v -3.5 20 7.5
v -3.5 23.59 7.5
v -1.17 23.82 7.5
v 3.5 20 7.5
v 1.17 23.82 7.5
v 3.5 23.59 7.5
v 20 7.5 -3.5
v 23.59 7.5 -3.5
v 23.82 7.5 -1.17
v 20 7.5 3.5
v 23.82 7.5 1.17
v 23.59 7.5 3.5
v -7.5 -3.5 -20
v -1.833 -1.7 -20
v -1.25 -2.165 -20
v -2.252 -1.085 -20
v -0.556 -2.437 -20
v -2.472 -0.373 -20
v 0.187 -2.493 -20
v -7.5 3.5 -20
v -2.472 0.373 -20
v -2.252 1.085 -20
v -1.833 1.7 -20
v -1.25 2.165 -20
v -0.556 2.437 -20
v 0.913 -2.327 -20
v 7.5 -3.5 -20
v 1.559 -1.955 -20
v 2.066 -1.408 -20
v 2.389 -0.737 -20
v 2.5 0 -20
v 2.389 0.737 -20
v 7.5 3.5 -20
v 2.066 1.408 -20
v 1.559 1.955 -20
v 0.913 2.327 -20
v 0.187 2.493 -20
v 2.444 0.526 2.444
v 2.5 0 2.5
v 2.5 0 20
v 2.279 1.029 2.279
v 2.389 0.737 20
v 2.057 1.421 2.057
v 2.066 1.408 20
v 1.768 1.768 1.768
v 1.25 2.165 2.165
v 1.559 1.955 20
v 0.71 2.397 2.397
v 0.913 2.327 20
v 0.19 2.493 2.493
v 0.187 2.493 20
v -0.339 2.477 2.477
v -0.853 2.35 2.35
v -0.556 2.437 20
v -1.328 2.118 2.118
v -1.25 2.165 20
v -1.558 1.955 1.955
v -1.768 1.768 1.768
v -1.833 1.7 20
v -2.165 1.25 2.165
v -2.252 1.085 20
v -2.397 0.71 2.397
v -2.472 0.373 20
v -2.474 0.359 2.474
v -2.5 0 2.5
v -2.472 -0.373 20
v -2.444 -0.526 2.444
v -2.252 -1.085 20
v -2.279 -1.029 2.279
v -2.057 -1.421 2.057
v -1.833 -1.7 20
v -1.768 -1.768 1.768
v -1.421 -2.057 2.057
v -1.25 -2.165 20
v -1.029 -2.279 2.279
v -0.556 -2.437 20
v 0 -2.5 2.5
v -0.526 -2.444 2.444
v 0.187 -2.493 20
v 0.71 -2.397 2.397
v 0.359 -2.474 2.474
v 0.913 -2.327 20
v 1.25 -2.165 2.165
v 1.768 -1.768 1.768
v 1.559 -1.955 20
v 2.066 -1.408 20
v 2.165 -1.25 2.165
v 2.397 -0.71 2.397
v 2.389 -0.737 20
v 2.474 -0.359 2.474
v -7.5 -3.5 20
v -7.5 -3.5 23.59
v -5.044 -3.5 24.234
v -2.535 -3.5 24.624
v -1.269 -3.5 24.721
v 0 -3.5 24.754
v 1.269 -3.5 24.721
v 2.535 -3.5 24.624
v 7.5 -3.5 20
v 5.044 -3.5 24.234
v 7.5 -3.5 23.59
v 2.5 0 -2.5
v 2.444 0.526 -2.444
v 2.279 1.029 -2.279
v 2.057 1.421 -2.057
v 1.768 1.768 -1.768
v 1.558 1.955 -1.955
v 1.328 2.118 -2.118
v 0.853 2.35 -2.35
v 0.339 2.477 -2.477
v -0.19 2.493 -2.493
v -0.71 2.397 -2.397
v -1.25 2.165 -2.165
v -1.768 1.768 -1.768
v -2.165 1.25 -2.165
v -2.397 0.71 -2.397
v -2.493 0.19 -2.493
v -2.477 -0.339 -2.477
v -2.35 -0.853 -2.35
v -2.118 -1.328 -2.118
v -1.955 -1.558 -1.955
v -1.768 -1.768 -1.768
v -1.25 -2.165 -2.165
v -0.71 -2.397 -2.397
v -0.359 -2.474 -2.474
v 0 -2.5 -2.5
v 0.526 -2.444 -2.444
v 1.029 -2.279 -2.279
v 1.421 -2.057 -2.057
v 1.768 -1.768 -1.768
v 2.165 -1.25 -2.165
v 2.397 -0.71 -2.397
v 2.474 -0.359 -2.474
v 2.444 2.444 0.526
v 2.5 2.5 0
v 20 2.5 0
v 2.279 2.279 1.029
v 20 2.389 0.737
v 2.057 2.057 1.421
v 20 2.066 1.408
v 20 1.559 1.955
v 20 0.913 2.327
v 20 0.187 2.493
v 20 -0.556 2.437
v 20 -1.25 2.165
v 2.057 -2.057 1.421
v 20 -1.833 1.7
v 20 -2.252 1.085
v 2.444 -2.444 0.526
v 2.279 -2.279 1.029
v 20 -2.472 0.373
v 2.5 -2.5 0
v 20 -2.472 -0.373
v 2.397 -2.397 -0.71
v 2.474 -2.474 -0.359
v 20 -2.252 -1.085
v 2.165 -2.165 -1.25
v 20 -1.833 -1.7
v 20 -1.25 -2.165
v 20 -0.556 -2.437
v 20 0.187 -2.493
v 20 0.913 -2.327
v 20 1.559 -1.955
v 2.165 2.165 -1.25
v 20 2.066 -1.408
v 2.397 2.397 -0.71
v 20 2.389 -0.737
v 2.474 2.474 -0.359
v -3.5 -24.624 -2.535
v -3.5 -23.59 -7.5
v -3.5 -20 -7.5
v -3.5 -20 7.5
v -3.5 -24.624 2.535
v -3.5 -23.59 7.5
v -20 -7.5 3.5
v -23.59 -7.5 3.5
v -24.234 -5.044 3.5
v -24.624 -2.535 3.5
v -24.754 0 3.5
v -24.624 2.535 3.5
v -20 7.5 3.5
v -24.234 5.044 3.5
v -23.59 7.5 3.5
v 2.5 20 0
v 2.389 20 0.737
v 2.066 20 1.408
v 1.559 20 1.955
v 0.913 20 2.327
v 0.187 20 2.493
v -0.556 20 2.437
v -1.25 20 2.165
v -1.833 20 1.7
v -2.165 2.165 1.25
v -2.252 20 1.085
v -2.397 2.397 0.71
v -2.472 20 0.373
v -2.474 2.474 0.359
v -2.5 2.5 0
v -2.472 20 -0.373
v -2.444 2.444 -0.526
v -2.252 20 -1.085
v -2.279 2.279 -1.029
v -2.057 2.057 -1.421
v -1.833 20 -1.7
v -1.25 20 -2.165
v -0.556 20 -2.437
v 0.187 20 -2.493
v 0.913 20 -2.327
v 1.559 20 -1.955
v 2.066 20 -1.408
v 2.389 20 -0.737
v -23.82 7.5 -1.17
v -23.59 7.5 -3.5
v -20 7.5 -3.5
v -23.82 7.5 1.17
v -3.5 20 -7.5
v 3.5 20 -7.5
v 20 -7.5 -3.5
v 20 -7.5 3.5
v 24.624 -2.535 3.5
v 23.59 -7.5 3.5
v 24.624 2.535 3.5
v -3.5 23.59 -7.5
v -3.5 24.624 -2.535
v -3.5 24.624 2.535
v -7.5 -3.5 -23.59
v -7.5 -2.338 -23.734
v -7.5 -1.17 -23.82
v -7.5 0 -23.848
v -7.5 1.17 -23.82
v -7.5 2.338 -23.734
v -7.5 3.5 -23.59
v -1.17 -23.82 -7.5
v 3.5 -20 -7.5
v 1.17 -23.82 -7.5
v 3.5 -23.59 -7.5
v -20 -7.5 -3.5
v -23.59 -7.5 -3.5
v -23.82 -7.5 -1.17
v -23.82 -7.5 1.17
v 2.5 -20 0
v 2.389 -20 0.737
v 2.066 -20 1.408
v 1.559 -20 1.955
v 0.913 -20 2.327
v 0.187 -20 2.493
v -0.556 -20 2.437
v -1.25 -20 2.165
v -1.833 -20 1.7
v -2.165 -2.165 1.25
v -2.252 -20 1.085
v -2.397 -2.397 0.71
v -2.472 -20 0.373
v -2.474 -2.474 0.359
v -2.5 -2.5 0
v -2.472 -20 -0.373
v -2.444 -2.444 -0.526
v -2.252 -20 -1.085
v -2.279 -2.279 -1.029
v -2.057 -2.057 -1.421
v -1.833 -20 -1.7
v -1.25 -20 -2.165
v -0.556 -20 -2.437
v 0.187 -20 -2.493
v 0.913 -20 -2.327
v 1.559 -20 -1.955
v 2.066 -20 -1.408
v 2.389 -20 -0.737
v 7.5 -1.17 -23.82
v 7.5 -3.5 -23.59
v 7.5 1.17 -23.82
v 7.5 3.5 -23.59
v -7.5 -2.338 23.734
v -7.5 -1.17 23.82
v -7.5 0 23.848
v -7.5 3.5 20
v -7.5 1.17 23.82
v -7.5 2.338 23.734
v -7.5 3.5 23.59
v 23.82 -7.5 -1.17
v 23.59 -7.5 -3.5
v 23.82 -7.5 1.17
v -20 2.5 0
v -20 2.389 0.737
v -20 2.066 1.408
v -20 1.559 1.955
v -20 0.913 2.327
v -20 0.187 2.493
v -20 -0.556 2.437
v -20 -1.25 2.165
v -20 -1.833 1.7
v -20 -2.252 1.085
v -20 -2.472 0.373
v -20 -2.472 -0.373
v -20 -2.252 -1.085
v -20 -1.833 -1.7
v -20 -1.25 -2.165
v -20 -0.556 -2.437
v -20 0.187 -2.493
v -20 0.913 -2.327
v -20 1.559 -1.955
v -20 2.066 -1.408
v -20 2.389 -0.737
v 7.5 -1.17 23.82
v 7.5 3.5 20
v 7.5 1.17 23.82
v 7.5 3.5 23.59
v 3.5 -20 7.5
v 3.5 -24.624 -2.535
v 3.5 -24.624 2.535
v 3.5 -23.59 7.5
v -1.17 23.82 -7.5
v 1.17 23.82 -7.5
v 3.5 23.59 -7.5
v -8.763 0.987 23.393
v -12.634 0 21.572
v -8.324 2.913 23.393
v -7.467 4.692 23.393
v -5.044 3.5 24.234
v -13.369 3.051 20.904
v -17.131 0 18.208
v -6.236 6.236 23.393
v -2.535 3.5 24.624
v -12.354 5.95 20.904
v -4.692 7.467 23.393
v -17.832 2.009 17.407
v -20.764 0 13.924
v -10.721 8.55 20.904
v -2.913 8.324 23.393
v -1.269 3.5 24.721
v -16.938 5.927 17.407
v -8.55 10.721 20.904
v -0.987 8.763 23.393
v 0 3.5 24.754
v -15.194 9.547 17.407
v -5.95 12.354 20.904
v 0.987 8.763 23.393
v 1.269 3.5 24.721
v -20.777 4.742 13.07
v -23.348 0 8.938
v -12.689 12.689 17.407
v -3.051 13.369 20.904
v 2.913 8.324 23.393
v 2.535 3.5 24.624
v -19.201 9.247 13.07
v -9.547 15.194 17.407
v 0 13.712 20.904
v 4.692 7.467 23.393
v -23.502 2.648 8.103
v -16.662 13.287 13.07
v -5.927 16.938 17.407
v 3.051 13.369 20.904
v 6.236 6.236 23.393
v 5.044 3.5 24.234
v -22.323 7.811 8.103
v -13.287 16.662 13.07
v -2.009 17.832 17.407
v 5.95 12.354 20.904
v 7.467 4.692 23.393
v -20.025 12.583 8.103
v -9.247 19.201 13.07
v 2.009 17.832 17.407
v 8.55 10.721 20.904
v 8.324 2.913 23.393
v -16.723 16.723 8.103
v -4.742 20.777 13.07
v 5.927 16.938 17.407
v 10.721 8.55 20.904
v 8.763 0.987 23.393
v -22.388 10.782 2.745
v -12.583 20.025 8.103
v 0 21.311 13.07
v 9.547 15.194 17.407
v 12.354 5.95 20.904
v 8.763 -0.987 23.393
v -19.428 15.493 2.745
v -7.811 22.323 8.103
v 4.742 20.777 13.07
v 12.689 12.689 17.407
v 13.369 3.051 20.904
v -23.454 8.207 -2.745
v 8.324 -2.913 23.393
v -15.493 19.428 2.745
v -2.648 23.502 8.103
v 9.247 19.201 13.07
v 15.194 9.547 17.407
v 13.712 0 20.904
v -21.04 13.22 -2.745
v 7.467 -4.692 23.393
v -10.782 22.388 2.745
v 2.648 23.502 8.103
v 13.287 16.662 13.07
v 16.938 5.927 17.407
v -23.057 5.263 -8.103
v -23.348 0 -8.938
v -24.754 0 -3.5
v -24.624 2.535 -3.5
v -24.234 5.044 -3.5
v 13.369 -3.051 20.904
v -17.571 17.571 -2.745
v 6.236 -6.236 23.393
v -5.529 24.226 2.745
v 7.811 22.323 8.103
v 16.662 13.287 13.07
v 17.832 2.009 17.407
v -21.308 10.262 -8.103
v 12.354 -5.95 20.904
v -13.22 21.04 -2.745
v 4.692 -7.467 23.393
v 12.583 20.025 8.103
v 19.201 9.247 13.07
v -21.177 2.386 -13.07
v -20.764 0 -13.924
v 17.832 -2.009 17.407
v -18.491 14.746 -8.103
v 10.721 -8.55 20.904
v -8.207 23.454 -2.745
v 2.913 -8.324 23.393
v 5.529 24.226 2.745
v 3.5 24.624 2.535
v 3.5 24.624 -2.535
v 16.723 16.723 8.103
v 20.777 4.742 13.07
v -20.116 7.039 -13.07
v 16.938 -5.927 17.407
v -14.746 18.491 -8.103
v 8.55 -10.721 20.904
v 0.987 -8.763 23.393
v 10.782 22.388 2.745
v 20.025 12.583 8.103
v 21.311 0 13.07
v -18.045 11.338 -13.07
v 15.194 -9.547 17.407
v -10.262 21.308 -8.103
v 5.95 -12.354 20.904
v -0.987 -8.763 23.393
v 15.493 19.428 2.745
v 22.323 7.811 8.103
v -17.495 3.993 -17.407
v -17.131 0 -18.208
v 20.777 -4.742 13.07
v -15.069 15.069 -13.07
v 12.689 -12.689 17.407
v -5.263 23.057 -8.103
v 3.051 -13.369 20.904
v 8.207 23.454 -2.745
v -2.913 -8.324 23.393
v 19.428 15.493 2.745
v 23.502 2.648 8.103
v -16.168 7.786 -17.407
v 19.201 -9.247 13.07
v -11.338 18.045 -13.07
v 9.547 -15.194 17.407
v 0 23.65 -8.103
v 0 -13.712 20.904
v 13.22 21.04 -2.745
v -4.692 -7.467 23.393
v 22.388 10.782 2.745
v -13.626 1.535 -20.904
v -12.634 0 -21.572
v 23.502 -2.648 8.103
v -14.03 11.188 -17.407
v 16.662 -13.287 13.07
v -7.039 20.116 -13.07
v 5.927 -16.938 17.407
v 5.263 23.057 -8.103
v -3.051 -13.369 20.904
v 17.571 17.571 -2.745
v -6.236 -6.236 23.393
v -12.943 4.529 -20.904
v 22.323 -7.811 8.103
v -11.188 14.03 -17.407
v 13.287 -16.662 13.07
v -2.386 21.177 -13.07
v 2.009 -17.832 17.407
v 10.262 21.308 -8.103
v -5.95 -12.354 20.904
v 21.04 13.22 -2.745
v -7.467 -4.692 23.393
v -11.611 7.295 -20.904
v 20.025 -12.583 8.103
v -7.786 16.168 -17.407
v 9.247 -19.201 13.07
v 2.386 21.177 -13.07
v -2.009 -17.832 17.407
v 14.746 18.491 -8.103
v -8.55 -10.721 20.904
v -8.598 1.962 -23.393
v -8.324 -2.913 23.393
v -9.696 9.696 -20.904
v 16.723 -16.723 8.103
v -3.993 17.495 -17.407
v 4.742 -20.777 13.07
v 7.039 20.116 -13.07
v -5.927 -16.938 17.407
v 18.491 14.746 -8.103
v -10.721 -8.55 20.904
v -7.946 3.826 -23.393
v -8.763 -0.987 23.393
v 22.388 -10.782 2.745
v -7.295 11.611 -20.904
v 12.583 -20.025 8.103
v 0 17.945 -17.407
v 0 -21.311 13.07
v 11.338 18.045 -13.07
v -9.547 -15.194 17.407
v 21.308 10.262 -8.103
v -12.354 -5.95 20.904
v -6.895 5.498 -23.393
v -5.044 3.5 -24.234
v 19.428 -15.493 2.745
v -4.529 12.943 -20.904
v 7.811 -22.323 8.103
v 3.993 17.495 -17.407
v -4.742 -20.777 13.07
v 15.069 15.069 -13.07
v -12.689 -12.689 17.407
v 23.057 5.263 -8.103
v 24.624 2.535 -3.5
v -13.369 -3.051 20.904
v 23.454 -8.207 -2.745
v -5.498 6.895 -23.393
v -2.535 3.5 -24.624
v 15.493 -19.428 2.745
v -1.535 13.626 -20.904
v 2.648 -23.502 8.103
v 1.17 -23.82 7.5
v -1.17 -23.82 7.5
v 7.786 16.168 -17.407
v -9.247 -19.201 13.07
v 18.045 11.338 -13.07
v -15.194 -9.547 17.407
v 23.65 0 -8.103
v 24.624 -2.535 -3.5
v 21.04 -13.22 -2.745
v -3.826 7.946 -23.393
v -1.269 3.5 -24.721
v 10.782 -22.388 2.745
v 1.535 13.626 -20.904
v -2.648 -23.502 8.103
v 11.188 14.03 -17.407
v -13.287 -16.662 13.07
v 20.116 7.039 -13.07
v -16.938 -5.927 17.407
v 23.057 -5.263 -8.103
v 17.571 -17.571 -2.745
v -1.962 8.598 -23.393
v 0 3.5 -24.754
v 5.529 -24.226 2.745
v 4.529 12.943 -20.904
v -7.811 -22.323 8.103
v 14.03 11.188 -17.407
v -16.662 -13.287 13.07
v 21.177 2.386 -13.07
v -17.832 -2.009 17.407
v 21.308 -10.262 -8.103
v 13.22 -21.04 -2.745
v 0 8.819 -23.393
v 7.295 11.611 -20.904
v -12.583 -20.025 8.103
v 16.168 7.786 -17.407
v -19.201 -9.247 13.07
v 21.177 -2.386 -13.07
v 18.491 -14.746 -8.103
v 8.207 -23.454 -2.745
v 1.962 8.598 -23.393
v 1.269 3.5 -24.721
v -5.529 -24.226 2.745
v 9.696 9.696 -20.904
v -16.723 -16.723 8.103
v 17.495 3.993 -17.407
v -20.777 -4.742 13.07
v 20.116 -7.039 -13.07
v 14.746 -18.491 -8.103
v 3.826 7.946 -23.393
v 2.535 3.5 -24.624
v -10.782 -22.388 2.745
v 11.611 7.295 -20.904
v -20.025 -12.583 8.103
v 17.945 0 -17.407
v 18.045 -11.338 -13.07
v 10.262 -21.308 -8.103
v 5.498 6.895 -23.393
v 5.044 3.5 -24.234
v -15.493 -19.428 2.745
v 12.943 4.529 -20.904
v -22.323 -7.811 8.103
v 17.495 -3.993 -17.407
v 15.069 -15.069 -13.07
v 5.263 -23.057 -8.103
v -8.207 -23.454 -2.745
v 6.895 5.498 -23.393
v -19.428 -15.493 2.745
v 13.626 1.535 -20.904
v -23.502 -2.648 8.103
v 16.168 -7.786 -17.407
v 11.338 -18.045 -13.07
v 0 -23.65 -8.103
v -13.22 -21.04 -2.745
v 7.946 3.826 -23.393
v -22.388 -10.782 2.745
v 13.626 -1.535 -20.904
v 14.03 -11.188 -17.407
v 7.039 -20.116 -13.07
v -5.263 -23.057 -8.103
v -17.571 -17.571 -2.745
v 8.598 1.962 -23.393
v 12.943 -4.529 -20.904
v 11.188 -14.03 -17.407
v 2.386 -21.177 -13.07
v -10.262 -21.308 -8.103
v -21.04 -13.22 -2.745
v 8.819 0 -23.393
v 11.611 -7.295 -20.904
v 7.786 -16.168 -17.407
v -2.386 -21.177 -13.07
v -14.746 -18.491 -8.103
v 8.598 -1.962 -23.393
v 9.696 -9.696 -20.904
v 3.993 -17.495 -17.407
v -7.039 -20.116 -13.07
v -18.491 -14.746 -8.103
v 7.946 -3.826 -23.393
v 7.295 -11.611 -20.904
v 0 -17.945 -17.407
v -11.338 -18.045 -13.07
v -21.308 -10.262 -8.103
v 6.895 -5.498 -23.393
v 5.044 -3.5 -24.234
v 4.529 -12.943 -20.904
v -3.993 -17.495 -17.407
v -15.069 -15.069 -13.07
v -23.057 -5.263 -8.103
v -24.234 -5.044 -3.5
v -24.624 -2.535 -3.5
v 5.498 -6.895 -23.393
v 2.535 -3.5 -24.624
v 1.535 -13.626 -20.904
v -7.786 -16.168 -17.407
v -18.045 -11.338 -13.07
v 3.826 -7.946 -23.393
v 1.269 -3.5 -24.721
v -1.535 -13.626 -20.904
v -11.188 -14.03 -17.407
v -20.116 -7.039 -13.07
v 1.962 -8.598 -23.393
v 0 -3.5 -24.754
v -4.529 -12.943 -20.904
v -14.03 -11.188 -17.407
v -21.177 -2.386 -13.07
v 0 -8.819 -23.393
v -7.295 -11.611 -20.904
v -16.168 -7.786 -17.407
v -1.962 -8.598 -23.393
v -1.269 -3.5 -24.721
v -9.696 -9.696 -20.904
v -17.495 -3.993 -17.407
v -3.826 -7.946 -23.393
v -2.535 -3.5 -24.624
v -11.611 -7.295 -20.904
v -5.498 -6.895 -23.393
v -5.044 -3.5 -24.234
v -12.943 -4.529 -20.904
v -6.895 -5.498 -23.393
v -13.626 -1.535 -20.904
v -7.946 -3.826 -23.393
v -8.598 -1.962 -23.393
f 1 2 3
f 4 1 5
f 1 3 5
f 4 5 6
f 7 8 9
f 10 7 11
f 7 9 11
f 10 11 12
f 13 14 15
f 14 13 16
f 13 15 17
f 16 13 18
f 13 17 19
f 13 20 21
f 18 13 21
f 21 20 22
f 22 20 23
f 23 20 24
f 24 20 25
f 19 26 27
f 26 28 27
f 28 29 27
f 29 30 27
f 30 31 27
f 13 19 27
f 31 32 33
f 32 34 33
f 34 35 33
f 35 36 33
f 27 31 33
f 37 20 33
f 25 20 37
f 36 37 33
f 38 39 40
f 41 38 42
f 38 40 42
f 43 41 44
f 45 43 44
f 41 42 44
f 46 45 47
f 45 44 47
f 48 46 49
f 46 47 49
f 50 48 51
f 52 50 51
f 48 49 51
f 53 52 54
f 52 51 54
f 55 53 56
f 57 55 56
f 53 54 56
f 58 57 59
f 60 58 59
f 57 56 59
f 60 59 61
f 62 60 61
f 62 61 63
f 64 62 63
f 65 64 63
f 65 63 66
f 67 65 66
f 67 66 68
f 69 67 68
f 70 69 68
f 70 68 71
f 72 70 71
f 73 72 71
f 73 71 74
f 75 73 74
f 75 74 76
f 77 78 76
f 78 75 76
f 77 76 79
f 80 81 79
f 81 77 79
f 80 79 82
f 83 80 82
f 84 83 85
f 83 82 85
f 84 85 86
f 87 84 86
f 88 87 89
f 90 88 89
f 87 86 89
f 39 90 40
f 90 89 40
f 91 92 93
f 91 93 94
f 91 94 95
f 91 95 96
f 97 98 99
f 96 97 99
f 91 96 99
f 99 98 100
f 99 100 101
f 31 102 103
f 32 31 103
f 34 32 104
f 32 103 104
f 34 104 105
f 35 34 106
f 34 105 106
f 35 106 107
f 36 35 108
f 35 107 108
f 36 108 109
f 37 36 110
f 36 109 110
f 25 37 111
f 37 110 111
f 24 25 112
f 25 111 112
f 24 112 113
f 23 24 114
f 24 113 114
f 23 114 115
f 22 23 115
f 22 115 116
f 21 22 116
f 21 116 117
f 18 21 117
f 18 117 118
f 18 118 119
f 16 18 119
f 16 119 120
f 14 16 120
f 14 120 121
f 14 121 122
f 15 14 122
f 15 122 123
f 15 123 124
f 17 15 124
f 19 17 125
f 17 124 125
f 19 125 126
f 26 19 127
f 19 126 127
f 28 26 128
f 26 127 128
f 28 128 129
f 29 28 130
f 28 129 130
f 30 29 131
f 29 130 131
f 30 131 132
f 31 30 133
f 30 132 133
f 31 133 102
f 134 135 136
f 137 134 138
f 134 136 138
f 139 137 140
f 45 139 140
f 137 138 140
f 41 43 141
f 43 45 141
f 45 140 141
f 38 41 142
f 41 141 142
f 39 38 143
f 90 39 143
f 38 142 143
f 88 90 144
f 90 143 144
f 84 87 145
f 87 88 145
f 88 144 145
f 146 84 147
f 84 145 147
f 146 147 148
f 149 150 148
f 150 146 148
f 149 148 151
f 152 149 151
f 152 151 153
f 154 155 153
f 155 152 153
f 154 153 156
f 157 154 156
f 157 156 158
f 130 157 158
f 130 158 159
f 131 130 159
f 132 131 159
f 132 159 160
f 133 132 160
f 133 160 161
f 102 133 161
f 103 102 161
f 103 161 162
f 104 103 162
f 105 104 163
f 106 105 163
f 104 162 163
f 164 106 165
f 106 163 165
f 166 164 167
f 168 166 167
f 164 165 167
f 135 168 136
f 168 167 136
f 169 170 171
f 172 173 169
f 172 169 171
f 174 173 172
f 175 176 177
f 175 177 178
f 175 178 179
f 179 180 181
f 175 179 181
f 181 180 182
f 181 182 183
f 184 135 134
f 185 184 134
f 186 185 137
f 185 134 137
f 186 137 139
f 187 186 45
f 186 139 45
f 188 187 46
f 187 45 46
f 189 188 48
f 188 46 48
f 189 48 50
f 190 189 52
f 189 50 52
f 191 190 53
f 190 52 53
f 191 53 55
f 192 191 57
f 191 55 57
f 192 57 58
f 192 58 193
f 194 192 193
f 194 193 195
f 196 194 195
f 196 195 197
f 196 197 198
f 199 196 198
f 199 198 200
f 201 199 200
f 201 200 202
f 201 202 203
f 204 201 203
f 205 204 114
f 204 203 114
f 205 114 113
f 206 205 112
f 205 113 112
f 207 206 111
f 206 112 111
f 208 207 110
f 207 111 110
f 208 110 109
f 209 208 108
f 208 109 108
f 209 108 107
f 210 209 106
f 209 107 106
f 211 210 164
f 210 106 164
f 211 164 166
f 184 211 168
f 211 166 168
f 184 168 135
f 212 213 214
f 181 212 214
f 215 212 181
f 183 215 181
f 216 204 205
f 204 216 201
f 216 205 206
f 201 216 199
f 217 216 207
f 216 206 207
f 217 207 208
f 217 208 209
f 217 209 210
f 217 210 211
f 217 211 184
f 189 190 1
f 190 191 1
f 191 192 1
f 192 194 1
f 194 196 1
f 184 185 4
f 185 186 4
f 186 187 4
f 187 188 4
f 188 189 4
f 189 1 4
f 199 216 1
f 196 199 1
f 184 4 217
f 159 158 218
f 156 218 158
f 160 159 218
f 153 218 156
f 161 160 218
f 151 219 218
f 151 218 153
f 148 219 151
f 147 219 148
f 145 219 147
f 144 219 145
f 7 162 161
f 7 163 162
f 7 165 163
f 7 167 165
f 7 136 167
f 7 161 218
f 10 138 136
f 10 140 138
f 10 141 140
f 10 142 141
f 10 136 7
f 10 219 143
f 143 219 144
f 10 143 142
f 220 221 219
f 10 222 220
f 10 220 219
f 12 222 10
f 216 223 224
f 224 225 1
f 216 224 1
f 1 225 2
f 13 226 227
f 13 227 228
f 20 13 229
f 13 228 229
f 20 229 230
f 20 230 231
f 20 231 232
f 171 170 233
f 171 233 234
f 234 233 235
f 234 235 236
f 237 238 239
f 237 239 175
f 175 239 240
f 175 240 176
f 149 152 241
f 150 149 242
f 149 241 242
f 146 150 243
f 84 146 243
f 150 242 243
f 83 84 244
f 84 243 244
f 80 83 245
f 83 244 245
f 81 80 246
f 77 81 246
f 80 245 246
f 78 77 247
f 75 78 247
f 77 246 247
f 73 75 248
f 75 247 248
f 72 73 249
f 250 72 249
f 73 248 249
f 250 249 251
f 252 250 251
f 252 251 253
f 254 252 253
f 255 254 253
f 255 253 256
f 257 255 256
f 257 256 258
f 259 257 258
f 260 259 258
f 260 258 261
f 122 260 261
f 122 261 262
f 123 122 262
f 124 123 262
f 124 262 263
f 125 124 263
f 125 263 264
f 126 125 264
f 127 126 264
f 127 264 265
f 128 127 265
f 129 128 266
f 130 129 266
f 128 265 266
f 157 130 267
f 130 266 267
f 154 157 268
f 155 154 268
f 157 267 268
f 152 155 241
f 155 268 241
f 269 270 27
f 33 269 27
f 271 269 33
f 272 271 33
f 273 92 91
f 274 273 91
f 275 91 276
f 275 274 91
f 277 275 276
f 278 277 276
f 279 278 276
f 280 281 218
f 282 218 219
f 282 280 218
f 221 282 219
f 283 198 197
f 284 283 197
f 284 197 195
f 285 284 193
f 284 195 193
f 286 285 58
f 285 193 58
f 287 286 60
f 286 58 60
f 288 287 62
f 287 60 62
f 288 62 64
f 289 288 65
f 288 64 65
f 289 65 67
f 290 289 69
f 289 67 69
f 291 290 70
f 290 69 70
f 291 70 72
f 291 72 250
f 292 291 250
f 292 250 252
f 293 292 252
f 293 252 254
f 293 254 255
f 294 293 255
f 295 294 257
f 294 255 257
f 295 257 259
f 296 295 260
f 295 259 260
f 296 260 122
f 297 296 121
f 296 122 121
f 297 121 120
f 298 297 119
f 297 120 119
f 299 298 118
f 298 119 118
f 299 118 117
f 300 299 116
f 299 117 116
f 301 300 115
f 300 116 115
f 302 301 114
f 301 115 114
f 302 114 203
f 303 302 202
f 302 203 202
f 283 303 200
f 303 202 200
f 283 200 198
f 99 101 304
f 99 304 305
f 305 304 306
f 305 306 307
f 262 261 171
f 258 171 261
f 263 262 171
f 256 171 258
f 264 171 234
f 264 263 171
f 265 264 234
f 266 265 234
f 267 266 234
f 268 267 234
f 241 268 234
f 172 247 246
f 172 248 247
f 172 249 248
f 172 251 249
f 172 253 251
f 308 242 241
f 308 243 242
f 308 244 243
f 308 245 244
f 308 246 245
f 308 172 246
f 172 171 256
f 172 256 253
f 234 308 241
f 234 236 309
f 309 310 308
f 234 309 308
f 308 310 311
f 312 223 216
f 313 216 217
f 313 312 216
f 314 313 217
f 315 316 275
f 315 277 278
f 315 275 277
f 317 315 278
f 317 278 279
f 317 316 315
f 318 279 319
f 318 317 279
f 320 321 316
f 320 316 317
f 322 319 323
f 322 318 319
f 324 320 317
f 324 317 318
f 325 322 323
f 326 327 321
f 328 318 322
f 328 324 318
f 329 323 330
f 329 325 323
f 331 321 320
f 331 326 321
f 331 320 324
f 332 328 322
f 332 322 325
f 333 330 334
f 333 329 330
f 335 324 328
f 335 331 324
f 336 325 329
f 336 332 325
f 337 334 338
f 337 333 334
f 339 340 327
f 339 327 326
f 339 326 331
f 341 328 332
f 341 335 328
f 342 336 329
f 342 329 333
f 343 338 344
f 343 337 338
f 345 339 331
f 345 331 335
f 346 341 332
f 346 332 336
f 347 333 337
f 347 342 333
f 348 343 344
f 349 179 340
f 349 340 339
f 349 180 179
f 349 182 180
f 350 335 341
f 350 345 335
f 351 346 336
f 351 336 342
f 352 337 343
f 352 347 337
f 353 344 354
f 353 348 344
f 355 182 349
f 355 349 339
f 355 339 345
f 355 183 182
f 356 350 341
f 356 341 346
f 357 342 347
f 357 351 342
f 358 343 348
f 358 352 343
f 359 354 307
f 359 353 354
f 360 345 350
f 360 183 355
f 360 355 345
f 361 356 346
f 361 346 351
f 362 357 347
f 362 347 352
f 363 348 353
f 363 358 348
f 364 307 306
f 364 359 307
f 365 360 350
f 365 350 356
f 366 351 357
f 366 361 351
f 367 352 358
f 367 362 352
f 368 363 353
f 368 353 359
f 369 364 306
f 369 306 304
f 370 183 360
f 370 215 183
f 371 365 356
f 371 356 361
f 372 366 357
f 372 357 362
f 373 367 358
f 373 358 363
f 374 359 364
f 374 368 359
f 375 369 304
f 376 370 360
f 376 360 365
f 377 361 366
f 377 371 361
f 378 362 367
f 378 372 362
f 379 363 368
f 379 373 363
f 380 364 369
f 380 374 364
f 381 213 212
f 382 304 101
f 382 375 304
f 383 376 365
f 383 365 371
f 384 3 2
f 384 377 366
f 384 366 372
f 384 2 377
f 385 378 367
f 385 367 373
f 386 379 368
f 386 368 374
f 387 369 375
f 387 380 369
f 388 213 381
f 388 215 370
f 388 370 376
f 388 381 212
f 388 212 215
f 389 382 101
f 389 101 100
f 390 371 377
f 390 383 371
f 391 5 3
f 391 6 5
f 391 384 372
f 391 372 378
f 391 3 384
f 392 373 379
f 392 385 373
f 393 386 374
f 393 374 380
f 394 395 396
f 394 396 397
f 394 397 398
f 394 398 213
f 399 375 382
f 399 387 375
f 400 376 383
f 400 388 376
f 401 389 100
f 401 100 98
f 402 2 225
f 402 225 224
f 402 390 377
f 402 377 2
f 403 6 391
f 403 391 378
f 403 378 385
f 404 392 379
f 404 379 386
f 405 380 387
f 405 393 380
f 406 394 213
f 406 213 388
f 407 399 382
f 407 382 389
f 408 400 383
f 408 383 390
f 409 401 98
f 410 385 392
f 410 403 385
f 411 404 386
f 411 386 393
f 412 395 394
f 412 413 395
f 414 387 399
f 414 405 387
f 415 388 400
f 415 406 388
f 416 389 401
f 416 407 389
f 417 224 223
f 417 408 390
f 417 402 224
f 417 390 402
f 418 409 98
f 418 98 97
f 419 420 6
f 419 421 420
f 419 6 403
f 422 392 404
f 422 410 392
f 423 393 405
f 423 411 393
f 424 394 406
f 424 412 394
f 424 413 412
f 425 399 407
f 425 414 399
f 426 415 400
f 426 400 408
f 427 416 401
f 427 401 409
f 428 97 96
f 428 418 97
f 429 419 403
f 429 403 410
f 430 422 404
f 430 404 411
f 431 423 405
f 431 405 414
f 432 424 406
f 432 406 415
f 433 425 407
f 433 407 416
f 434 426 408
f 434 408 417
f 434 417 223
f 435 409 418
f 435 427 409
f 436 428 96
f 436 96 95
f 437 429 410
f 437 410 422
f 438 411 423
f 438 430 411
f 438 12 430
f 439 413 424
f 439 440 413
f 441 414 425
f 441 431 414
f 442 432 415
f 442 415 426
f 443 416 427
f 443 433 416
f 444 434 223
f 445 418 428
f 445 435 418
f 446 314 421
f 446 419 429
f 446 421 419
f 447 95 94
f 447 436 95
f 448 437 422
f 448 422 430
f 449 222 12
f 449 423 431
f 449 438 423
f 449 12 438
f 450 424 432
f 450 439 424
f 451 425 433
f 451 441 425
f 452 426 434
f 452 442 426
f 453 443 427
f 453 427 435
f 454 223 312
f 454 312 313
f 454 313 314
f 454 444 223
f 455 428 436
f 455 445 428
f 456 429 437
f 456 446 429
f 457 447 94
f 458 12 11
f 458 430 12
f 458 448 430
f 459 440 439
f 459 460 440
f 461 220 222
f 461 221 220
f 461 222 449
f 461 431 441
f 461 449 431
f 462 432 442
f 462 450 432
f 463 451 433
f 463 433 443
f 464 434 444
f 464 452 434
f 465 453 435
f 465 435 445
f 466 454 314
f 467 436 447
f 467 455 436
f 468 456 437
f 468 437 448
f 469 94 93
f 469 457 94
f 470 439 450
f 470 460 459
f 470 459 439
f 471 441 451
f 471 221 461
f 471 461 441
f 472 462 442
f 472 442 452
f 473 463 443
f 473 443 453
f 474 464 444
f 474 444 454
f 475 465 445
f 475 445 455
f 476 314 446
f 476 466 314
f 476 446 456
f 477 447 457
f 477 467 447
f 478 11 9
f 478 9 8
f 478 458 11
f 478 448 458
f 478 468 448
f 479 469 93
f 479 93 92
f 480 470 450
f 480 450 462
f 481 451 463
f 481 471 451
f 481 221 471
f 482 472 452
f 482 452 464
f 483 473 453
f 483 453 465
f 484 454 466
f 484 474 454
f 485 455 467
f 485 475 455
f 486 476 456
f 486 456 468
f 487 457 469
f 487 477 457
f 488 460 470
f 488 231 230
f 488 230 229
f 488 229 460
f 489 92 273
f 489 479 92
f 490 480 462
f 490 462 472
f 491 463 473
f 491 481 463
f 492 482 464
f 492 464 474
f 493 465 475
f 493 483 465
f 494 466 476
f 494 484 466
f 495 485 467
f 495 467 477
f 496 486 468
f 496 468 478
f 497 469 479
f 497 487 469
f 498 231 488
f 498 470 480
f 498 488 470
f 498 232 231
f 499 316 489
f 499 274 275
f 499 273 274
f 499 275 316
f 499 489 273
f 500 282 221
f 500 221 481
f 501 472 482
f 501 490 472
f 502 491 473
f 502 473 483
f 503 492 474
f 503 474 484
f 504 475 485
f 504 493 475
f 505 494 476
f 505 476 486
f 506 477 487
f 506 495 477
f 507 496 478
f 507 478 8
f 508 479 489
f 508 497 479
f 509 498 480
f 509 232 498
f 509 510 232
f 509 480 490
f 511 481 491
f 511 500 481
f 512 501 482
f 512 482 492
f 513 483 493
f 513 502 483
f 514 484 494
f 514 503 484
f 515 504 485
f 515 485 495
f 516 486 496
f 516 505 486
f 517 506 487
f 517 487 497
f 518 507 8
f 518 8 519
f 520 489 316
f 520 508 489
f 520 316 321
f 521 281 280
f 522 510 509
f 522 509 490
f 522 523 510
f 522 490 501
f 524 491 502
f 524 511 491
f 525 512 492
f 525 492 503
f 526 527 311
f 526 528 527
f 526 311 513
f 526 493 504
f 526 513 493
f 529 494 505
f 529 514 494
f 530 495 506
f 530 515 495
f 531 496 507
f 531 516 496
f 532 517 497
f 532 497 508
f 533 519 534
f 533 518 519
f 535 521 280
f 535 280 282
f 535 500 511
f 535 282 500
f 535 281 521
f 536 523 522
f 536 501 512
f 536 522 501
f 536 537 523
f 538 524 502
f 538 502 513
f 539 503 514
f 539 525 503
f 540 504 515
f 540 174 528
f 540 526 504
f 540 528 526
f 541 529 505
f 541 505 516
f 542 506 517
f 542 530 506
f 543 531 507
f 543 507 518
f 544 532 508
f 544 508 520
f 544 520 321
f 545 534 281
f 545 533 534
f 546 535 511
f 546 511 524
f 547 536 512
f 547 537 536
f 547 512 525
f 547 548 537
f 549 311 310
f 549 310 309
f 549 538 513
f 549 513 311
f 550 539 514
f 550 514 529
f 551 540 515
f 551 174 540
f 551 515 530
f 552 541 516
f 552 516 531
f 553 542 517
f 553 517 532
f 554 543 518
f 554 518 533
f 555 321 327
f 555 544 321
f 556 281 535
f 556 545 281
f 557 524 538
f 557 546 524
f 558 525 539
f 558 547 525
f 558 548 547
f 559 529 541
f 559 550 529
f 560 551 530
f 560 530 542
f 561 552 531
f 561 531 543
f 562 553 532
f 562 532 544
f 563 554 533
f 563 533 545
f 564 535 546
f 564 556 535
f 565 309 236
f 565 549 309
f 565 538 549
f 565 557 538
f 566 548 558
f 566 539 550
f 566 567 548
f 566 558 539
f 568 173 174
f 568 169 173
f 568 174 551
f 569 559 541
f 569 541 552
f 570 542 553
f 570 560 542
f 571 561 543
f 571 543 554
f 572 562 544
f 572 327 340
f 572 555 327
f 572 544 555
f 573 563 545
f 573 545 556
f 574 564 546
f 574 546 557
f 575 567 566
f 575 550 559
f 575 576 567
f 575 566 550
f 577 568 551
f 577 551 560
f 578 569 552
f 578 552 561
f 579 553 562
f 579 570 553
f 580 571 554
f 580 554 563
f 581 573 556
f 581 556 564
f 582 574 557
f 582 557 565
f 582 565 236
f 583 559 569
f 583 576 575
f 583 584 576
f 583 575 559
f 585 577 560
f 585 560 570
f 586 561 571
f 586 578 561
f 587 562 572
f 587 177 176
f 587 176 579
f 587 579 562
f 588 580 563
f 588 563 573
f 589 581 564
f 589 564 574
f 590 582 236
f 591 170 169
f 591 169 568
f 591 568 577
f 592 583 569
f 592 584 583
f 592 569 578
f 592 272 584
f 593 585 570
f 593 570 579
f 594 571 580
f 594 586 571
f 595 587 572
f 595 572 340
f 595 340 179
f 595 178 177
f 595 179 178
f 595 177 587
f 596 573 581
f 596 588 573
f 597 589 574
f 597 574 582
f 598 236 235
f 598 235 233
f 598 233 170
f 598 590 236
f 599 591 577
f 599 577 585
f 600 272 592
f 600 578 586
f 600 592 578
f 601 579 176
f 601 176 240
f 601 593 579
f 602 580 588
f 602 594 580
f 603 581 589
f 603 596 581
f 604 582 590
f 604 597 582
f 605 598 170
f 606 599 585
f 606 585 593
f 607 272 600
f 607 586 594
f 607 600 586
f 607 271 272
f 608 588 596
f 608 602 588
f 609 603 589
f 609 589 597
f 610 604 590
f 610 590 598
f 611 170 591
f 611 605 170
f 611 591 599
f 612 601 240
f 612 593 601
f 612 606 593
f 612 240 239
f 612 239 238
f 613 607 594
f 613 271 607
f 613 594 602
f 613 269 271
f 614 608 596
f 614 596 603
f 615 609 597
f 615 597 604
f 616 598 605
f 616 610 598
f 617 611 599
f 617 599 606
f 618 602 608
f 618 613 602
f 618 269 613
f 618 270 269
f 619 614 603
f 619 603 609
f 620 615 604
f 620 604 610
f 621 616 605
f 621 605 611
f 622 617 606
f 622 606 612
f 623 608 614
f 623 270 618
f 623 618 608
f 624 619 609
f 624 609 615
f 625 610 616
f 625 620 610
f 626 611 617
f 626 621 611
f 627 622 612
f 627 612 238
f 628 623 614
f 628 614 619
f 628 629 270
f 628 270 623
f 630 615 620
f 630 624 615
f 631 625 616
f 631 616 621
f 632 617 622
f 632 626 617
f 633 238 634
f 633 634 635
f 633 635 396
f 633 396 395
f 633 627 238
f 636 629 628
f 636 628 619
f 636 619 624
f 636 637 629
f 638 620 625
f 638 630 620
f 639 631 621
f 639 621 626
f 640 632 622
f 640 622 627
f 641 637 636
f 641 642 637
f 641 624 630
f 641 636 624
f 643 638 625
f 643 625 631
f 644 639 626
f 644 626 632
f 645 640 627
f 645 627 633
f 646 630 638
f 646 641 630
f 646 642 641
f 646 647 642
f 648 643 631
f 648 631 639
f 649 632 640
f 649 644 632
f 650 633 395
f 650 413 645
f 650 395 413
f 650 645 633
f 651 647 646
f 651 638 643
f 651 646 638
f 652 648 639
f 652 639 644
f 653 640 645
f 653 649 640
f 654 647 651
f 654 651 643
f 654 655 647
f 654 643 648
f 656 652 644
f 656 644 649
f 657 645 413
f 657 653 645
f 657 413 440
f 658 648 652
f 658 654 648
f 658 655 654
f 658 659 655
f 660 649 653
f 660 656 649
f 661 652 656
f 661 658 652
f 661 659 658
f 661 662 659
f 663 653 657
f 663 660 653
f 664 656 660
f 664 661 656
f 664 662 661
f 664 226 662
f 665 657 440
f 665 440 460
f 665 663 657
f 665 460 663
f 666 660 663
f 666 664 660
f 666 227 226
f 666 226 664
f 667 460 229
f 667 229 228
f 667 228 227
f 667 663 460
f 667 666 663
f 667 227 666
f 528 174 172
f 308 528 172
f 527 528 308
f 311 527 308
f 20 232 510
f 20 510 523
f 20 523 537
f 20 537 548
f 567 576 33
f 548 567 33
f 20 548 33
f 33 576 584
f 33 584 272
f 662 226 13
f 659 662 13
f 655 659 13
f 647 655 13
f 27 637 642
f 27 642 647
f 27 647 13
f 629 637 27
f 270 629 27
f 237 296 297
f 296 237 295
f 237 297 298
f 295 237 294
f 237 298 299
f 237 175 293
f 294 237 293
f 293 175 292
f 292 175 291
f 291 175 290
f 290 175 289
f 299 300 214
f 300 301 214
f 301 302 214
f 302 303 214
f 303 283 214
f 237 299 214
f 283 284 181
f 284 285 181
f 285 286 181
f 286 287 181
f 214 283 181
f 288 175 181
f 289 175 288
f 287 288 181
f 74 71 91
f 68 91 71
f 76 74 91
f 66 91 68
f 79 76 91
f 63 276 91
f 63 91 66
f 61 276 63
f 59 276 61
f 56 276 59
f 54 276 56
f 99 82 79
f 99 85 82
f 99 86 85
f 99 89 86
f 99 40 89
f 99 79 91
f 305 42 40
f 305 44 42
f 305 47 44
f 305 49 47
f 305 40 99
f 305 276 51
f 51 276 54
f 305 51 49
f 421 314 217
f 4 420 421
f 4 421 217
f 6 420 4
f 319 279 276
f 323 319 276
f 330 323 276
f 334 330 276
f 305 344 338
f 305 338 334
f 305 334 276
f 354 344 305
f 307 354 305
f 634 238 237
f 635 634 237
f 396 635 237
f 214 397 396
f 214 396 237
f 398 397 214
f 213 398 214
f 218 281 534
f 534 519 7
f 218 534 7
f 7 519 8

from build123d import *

# Parameters (mm, degrees)
F3_W      = 7
F3_H      = 15
F4_DEPTH  = 5
F5_R      = 2.5
F6_DEPTH  = 45.001
F8_W      = 15
F8_H      = 7
F9_DEPTH  = 5
F10_R     = 2.5
F11_DEPTH = 44.754787589
F13_W     = 15
F13_H     = 7
F14_DEPTH = 5
F15_R     = 2.5
F16_DEPTH = 44.754787589


# Not quite as in the source:
# - a pattern or mirror of a feature is missing from the dataset's text; its kind, count and spacing are read off the source's solid


with BuildPart() as f1:
    # F0 (on Front) → F1 (revolve)
    with BuildSketch(Plane.XZ):
        with BuildLine():
            Line((0, -25), (0, 25))
            ThreePointArc((0, 25), (-25, 0), (0, -25))
        make_face()
    revolve(axis=Axis((0, 0, 0), (0, 0, -1)))

    # F3 (on offset) → F4 (cut)
    with BuildSketch(Plane.XZ.offset(25)):
        Rectangle(F3_W, F3_H)
    f4 = extrude(amount=-F4_DEPTH, mode=Mode.SUBTRACT)

    # F4_copies: F4 across plane
    add(f4.mirror(Plane.ZX), mode=Mode.SUBTRACT)

    # F5 (on face) → F6 (cut, through all)
    with BuildSketch(Plane.XZ.offset(20)):
        Circle(F5_R)
    extrude(amount=-F6_DEPTH, mode=Mode.SUBTRACT)

    # F8 (on offset) → F9 (cut)
    with BuildSketch(Plane.XY.offset(25)):
        Rectangle(F8_W, F8_H)
    f9 = extrude(amount=-F9_DEPTH, mode=Mode.SUBTRACT)

    # F9_copies: F9 across plane
    add(f9.mirror(Plane(origin=(0, 0, 0), x_dir=(-1, 0, 0), z_dir=(0, 0, -1))), mode=Mode.SUBTRACT)

    # F10 (on face) → F11 (cut, through all)
    with BuildSketch(Plane.XY.offset(20)):
        Circle(F10_R)
    extrude(amount=-F11_DEPTH, mode=Mode.SUBTRACT)

    # F13 (on offset) → F14 (cut)
    with BuildSketch(Plane.YZ.offset(25)):
        Rectangle(F13_W, F13_H)
    f14 = extrude(amount=-F14_DEPTH, mode=Mode.SUBTRACT)

    # F14_copies: F14 across plane
    add(f14.mirror(Plane(origin=(0, 0, 0), x_dir=(0, 0, -1), z_dir=(-1, 0, 0))), mode=Mode.SUBTRACT)

    # F15 (on face) → F16 (cut, through all)
    with BuildSketch(Plane.YZ.offset(20)):
        Circle(F15_R)
    extrude(amount=-F16_DEPTH, mode=Mode.SUBTRACT)


solid = f1.part
